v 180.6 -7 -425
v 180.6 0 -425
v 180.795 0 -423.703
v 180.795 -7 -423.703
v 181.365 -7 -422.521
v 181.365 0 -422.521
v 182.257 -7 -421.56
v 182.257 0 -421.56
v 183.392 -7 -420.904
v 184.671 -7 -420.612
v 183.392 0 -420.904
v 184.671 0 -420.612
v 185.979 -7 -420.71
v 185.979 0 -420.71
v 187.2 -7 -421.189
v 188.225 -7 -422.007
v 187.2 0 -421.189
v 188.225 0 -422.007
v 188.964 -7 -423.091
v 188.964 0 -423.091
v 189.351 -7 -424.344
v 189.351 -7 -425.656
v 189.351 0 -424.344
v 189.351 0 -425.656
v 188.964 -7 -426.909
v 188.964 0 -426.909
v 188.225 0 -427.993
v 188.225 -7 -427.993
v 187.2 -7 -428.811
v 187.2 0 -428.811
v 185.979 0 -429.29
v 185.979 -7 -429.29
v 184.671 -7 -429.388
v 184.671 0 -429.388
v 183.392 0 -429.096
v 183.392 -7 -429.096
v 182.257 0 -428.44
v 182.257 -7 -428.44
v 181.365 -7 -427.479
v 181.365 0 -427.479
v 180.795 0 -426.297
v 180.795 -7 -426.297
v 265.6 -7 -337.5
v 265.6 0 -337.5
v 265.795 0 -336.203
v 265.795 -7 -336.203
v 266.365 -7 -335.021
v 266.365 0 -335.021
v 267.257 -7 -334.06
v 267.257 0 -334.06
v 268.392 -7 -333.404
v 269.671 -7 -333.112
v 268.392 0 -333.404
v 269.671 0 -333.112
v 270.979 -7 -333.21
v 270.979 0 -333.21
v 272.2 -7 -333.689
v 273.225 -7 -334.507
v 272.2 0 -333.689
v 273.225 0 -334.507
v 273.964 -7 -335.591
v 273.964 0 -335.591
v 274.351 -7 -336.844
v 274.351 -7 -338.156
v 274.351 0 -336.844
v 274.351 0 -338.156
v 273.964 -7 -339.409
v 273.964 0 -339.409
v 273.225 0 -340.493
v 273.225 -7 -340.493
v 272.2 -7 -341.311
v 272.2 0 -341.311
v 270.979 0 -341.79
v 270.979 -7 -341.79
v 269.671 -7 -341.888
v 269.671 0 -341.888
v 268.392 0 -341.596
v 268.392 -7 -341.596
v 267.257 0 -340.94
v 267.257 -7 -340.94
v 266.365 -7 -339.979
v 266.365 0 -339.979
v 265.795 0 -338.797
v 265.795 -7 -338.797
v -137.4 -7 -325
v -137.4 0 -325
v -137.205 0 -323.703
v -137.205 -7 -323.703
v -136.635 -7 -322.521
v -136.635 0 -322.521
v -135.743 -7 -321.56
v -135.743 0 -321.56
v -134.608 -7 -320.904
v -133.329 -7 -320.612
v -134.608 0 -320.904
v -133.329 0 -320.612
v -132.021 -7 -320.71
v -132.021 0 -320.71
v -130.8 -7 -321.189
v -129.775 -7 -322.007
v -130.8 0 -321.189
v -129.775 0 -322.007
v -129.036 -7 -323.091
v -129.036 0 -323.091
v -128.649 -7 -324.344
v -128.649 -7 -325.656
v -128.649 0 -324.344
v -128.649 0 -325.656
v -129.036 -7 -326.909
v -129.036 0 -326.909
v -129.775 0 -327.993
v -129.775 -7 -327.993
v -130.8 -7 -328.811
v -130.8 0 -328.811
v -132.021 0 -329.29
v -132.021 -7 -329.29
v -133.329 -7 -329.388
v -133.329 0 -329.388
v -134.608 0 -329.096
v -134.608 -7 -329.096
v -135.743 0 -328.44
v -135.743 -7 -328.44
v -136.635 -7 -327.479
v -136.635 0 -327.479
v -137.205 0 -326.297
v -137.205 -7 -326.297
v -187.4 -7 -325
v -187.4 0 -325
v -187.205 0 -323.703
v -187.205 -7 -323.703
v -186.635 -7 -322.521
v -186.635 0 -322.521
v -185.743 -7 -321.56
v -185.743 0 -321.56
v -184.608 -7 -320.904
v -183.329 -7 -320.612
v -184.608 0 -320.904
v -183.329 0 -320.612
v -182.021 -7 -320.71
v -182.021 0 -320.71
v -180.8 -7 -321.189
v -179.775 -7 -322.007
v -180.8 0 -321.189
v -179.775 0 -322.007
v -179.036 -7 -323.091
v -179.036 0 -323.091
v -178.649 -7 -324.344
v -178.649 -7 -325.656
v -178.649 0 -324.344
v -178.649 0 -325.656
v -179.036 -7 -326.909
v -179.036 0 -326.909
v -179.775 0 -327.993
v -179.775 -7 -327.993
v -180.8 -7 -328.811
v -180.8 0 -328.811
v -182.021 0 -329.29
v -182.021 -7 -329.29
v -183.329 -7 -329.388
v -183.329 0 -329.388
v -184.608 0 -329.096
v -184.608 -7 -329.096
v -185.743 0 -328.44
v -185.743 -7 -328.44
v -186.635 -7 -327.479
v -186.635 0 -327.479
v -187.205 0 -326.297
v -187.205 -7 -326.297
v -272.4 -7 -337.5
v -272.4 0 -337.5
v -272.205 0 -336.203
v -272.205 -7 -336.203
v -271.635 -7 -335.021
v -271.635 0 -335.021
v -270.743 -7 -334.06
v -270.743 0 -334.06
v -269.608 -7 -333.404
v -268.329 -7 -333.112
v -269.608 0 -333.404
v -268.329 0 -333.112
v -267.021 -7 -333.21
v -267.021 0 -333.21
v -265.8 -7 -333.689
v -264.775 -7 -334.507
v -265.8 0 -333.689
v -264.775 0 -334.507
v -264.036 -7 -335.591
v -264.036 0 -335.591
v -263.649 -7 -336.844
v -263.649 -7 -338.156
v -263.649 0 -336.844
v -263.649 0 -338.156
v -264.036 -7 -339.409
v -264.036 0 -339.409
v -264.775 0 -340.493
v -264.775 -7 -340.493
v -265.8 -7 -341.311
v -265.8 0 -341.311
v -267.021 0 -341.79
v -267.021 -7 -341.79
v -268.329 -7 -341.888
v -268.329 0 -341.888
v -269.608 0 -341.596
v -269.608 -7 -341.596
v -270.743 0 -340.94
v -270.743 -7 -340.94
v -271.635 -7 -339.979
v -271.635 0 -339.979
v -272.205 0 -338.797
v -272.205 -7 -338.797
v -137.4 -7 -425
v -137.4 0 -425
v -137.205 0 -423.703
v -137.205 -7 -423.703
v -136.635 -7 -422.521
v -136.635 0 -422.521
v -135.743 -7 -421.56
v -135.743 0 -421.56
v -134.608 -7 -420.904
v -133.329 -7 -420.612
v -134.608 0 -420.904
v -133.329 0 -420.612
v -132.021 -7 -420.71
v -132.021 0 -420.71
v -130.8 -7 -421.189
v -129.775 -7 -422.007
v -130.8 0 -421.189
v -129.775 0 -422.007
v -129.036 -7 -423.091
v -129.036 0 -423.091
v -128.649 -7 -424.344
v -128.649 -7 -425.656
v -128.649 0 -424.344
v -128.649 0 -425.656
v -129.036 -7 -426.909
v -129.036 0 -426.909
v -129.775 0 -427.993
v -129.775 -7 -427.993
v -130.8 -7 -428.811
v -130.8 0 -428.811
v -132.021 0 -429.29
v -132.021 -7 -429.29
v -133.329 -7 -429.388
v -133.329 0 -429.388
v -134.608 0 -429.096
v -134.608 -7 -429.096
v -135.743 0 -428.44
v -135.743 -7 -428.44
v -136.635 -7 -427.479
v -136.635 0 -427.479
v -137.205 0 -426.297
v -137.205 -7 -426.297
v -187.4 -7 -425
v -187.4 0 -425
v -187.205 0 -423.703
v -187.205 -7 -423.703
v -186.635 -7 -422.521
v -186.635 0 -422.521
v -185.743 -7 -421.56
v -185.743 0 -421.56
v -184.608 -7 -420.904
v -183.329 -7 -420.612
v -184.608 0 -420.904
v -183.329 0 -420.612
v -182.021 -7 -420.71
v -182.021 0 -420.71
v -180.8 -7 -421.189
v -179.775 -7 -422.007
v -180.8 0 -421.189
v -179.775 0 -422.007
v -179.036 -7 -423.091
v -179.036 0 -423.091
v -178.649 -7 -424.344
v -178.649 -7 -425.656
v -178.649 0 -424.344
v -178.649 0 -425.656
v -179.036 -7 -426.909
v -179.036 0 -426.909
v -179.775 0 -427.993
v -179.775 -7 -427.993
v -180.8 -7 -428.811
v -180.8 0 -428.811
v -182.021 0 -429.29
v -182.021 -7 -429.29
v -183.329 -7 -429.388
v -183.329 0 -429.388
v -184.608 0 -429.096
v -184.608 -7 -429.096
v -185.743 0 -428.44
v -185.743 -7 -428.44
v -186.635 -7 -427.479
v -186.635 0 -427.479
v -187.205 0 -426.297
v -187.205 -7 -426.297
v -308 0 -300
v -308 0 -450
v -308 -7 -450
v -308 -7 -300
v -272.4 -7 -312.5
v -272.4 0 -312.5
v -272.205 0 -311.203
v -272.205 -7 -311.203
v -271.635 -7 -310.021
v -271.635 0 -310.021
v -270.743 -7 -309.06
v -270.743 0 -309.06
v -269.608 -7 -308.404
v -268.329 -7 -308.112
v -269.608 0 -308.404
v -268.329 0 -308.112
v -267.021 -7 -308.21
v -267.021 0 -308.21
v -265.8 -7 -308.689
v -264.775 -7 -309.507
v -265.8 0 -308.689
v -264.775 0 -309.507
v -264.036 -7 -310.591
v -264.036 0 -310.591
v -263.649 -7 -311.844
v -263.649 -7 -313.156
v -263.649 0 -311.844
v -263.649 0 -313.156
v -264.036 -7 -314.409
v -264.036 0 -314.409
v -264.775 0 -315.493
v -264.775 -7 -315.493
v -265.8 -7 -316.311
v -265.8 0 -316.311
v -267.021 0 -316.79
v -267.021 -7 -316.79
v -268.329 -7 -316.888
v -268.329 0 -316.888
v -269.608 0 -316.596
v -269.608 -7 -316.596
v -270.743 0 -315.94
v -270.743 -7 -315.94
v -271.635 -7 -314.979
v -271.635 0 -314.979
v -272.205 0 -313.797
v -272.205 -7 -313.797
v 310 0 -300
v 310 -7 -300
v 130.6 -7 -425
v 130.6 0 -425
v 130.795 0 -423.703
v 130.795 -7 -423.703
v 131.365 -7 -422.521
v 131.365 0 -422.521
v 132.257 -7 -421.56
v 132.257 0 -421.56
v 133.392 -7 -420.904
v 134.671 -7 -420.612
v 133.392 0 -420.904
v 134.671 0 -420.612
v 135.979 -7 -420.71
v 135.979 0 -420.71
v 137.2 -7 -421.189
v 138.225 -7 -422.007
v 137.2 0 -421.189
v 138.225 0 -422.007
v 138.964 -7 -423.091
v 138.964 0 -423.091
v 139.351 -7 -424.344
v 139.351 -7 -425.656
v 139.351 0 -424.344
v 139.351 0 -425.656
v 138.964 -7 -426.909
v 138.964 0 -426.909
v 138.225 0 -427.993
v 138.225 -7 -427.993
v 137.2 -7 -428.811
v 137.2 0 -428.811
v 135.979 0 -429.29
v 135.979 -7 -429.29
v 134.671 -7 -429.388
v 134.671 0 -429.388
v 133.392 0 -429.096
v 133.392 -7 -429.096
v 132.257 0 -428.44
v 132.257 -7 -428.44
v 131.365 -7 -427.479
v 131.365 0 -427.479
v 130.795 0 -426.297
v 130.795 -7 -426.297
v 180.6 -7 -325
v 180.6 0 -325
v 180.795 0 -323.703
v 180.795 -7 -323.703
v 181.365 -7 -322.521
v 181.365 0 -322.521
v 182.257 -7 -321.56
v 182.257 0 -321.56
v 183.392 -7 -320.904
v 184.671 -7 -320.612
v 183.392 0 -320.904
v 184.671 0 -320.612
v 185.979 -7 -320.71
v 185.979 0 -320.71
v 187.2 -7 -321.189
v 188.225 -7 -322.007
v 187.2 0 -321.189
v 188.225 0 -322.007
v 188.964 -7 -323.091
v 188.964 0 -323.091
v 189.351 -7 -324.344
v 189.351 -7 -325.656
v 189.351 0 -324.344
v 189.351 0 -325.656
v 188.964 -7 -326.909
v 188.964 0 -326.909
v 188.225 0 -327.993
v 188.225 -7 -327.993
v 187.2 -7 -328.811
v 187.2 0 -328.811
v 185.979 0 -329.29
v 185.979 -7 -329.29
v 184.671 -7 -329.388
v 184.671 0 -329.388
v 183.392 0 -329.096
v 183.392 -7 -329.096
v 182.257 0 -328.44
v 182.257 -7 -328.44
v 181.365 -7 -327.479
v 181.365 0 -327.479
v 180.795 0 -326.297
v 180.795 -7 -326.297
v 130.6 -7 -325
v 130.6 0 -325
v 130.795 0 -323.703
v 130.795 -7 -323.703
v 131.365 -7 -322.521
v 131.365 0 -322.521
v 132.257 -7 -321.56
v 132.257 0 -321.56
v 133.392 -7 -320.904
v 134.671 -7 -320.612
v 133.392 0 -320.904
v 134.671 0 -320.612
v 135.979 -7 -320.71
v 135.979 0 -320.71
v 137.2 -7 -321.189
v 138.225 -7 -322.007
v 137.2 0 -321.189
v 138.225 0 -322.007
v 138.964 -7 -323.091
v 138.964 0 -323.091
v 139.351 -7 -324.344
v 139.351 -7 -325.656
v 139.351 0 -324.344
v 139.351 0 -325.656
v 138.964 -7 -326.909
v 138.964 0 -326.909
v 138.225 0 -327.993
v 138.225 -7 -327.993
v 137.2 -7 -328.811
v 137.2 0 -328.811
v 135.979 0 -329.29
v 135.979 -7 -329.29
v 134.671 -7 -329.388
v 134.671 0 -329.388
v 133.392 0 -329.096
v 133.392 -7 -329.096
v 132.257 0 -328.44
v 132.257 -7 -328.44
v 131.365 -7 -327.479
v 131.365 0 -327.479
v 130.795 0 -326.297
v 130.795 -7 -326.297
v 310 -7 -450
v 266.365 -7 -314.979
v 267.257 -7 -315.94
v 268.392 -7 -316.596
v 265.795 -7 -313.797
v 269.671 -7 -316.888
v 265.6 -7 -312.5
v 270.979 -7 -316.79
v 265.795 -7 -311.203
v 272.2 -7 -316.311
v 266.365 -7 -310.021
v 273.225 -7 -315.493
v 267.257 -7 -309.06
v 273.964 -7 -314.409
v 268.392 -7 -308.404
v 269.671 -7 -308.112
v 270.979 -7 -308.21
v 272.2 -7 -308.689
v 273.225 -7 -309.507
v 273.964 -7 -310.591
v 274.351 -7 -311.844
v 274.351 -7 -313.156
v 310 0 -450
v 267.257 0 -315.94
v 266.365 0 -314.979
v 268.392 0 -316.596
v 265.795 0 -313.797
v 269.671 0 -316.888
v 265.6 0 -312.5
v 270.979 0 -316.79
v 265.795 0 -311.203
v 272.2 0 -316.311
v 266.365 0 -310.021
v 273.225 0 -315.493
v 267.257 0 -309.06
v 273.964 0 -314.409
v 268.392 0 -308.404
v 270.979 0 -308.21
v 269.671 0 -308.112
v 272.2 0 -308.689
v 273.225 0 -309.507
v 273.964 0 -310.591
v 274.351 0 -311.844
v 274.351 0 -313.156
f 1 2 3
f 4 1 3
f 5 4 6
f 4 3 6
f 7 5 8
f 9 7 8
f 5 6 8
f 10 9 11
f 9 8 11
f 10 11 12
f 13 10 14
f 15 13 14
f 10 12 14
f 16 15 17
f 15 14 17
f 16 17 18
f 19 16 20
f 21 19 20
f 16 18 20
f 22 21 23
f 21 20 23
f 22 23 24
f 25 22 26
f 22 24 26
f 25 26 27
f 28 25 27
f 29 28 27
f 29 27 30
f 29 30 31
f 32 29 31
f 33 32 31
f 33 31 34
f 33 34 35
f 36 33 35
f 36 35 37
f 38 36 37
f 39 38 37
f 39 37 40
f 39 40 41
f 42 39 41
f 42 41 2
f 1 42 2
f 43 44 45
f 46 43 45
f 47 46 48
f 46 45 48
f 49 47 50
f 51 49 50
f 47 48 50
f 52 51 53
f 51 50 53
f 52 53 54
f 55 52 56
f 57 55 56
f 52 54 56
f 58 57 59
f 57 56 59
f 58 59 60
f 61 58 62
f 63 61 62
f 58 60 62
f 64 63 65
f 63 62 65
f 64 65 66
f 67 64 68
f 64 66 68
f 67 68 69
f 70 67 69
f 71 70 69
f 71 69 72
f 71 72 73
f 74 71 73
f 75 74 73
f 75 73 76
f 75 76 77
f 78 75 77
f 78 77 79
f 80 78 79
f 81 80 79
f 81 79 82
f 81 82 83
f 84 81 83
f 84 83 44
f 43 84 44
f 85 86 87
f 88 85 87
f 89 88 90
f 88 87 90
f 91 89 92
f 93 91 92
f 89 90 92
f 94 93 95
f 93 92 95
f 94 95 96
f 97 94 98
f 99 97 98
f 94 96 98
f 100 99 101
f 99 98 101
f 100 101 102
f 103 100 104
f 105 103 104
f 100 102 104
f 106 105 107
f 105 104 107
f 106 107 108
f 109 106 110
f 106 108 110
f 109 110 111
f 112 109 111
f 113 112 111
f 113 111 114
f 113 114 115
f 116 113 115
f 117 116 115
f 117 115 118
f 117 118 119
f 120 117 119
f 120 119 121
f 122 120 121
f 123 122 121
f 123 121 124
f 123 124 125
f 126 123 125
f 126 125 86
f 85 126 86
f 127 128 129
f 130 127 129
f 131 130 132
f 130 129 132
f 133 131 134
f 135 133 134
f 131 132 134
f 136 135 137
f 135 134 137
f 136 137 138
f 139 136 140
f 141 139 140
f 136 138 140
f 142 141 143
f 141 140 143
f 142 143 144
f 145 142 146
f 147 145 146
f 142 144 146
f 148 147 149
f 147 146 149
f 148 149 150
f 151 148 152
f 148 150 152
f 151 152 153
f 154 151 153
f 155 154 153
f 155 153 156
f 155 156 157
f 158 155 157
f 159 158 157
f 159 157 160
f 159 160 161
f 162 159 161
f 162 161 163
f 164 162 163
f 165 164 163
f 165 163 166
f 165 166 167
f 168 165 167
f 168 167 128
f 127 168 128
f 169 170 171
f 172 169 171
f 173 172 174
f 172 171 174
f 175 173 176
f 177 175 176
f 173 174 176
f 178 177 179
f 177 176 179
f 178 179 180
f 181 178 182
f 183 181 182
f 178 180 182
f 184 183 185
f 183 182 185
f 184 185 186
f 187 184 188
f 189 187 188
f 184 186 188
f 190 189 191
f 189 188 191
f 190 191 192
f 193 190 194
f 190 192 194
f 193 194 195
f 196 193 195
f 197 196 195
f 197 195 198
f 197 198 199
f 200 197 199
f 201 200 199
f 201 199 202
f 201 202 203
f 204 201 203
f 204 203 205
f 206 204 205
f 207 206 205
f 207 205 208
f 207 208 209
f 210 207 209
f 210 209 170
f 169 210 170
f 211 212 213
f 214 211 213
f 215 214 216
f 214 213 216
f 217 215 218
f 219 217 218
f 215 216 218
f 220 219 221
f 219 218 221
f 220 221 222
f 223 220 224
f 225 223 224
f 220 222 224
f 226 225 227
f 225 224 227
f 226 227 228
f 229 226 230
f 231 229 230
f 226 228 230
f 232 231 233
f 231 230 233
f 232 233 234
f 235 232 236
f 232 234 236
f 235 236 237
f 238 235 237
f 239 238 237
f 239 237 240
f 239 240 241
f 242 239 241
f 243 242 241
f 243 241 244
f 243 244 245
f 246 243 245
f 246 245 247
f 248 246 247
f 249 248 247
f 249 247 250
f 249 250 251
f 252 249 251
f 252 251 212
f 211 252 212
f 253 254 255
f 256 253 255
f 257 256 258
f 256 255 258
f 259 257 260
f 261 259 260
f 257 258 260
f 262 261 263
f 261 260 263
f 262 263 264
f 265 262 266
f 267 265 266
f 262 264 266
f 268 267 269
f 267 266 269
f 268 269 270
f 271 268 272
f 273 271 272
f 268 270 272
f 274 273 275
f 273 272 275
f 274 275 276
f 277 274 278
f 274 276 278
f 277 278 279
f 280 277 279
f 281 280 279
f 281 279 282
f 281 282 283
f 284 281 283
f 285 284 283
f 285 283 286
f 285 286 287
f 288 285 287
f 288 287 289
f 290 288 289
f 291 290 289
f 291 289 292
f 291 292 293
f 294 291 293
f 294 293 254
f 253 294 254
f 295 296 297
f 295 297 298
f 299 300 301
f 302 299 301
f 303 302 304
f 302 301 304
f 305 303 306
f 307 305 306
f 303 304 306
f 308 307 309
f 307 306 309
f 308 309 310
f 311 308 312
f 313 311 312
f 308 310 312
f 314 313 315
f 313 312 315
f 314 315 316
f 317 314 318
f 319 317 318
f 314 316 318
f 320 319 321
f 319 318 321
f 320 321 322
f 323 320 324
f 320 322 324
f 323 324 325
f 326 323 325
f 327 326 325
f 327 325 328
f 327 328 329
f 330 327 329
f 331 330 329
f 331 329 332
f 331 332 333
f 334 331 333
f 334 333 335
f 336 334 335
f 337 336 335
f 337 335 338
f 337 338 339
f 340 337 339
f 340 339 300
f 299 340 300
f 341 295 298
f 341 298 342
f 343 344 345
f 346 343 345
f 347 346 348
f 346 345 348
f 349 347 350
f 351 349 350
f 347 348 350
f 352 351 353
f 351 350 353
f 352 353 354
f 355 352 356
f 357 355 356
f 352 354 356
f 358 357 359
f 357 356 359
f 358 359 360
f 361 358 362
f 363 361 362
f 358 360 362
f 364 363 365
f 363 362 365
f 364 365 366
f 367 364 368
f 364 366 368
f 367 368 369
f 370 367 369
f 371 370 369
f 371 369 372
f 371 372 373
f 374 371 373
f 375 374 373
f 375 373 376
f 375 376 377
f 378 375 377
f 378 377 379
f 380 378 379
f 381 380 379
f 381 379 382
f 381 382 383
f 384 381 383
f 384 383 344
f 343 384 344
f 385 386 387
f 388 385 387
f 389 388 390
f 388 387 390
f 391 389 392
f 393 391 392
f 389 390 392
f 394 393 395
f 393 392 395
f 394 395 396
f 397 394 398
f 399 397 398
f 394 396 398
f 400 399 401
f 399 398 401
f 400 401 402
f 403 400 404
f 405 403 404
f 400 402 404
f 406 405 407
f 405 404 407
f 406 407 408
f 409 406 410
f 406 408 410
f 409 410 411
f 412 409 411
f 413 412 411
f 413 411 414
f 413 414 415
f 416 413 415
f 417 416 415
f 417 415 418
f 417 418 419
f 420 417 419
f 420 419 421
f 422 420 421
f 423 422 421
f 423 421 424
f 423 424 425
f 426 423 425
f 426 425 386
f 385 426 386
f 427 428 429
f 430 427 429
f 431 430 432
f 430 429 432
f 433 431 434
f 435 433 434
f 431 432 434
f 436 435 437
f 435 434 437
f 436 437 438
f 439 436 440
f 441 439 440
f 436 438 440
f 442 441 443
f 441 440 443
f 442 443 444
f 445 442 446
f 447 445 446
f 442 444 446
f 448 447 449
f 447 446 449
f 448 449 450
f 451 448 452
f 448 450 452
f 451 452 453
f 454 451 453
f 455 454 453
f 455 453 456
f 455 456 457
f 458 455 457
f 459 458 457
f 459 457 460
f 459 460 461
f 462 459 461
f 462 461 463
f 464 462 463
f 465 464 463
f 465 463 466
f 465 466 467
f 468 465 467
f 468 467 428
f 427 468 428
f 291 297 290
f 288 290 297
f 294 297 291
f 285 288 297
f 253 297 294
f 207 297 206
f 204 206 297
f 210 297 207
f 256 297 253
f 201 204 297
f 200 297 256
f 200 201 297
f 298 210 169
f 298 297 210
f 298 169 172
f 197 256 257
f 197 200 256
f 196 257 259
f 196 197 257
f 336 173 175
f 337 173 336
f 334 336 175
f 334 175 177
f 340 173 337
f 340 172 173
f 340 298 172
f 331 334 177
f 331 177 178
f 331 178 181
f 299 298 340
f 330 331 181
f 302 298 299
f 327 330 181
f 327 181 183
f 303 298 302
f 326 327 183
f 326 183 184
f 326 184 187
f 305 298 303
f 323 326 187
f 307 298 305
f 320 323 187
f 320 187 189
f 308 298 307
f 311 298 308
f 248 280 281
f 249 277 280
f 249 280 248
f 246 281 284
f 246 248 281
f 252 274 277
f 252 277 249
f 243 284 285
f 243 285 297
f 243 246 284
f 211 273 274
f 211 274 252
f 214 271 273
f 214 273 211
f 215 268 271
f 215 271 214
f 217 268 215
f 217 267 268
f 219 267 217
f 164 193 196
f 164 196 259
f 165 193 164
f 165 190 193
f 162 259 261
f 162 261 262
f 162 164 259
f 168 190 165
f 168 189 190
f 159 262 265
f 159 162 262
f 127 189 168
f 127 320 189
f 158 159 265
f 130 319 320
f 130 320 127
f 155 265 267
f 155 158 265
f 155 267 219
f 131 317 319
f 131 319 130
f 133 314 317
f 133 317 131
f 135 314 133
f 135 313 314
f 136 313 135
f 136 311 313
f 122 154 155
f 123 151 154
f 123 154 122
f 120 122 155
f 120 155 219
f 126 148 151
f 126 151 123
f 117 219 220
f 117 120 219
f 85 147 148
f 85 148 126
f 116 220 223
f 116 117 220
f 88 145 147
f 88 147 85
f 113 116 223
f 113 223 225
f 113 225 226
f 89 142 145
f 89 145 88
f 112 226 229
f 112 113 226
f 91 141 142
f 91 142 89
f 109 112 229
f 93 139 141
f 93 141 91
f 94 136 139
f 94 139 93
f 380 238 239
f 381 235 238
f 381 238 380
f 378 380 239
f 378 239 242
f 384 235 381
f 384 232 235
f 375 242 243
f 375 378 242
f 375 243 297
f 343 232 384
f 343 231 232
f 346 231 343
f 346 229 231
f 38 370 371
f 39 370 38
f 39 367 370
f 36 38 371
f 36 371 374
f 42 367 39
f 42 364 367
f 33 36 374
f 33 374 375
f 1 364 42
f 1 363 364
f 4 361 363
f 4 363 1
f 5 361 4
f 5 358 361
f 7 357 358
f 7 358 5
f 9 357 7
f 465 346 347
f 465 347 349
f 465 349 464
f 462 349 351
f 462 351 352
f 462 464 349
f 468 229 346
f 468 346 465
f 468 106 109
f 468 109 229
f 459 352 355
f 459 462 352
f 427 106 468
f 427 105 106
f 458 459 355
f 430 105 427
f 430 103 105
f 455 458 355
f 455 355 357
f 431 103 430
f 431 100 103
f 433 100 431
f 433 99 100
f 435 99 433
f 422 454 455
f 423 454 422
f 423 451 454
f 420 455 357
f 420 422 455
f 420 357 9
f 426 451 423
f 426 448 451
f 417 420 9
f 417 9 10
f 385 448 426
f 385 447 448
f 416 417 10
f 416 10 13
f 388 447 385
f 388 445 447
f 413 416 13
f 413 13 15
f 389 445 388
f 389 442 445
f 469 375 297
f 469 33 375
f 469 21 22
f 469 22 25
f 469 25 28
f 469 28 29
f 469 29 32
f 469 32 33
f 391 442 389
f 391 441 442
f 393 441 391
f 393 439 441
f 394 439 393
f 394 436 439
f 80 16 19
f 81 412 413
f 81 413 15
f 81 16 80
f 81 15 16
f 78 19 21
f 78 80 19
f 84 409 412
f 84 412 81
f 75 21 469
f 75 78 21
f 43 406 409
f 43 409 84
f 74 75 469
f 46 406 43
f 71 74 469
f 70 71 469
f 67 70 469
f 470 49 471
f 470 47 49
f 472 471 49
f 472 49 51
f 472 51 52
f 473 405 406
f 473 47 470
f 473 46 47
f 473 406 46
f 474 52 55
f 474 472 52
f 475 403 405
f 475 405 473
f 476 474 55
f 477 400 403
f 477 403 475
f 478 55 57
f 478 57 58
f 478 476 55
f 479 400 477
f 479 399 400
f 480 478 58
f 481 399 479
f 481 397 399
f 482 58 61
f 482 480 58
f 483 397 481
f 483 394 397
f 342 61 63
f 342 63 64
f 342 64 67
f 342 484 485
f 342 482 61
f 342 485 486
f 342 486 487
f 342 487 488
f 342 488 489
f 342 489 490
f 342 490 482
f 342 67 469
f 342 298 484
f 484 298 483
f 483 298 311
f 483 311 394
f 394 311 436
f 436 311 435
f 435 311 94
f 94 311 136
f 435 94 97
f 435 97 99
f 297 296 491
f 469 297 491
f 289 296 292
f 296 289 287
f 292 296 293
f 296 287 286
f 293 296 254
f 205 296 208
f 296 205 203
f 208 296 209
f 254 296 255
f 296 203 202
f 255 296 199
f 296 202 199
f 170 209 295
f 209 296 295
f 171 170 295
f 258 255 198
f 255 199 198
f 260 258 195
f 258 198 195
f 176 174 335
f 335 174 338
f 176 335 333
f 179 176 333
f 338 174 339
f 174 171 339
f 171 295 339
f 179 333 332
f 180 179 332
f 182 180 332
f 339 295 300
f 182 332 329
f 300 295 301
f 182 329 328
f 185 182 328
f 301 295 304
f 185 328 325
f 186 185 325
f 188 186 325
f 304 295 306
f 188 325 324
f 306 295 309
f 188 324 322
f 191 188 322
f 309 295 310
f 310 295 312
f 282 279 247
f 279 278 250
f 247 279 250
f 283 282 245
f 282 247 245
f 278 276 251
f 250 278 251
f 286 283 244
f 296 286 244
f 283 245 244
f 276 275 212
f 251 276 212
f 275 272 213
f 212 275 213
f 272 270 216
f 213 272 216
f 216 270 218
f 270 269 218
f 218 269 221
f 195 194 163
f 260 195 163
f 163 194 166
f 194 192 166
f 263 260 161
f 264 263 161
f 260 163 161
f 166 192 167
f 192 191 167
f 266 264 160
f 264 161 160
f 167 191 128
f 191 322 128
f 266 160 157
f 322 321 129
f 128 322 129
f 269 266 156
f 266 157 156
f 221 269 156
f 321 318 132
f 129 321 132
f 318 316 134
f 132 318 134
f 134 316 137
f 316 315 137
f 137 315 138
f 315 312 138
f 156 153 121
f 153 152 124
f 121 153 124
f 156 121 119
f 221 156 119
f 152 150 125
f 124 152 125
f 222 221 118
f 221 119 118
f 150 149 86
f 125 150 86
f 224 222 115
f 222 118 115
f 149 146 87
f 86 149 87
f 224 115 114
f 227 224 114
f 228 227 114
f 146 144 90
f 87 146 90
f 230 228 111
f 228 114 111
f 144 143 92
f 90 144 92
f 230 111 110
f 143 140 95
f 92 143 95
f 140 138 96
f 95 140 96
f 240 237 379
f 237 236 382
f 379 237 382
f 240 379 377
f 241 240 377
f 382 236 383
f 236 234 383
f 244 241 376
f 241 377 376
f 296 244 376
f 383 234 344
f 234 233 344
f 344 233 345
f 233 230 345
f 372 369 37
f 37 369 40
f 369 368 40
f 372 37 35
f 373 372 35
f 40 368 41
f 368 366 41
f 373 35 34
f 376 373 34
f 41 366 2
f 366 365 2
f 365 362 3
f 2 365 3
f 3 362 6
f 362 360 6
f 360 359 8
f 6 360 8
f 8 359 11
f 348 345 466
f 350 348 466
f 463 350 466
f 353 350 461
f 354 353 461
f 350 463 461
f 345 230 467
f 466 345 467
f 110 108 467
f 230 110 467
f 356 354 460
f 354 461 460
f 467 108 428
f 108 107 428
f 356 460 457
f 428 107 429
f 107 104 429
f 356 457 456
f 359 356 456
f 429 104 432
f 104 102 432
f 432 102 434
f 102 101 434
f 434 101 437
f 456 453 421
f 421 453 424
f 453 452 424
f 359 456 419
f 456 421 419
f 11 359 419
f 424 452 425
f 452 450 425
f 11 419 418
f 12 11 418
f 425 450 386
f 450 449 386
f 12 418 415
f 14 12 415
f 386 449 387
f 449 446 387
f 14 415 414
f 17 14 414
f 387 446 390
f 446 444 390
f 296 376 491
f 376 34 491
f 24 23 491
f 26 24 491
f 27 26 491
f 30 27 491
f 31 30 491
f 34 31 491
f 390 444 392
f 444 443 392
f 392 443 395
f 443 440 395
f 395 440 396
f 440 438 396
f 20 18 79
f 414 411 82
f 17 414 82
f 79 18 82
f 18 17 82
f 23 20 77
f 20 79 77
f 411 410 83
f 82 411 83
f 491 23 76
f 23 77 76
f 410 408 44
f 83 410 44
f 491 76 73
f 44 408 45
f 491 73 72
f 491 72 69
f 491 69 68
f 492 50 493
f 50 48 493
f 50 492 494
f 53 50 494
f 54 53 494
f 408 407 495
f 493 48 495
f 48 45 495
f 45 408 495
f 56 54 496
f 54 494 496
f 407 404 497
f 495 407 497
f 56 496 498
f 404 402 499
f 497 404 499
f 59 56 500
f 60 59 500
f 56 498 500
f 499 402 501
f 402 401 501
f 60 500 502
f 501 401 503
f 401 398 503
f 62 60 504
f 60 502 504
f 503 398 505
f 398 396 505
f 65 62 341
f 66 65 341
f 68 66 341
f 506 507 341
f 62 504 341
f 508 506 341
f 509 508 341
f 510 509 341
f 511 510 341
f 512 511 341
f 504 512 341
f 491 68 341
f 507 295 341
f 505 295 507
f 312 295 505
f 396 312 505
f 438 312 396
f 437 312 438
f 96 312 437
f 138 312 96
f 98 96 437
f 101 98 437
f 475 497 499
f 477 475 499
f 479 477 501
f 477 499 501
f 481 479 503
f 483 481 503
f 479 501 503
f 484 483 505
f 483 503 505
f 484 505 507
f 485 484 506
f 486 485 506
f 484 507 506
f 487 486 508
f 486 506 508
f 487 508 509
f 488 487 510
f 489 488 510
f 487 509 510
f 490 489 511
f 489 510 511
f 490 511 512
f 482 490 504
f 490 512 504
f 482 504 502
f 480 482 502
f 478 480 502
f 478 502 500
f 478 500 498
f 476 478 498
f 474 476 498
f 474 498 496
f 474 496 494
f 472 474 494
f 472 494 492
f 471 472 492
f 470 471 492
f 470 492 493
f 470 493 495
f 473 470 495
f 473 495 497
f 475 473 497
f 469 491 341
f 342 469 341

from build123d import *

# Parameters (mm, degrees)
F0_W     = 618
F0_H     = 150
F1_DEPTH = 7
F3_D     = 8.8
F5_D     = 8.8


# Not quite as in the source:
# - a feature names something its author has since deleted; it is built from what else it names


with BuildPart() as f1:
    # F0 (on Front) → F1 (new body)
    with BuildSketch(Plane.XZ):
        with Locations((1, -375)):
            Rectangle(F0_W, F0_H)
    extrude(amount=F1_DEPTH)

    # F3 (through all)
    with Locations(Plane.XZ.offset(7)):
        with Locations((-183, -325), (-133, -325), (185, -325), (185, -425), (135, -425), (-133, -425), (-183, -425), (135, -325)):
            Hole(F3_D / 2)

    # F5 (through all)
    with Locations(Plane.XZ.offset(7)):
        with Locations((-268, -337.5), (-268, -312.5), (270, -337.5), (270, -312.5)):
            Hole(F5_D / 2)


solid = f1.part
